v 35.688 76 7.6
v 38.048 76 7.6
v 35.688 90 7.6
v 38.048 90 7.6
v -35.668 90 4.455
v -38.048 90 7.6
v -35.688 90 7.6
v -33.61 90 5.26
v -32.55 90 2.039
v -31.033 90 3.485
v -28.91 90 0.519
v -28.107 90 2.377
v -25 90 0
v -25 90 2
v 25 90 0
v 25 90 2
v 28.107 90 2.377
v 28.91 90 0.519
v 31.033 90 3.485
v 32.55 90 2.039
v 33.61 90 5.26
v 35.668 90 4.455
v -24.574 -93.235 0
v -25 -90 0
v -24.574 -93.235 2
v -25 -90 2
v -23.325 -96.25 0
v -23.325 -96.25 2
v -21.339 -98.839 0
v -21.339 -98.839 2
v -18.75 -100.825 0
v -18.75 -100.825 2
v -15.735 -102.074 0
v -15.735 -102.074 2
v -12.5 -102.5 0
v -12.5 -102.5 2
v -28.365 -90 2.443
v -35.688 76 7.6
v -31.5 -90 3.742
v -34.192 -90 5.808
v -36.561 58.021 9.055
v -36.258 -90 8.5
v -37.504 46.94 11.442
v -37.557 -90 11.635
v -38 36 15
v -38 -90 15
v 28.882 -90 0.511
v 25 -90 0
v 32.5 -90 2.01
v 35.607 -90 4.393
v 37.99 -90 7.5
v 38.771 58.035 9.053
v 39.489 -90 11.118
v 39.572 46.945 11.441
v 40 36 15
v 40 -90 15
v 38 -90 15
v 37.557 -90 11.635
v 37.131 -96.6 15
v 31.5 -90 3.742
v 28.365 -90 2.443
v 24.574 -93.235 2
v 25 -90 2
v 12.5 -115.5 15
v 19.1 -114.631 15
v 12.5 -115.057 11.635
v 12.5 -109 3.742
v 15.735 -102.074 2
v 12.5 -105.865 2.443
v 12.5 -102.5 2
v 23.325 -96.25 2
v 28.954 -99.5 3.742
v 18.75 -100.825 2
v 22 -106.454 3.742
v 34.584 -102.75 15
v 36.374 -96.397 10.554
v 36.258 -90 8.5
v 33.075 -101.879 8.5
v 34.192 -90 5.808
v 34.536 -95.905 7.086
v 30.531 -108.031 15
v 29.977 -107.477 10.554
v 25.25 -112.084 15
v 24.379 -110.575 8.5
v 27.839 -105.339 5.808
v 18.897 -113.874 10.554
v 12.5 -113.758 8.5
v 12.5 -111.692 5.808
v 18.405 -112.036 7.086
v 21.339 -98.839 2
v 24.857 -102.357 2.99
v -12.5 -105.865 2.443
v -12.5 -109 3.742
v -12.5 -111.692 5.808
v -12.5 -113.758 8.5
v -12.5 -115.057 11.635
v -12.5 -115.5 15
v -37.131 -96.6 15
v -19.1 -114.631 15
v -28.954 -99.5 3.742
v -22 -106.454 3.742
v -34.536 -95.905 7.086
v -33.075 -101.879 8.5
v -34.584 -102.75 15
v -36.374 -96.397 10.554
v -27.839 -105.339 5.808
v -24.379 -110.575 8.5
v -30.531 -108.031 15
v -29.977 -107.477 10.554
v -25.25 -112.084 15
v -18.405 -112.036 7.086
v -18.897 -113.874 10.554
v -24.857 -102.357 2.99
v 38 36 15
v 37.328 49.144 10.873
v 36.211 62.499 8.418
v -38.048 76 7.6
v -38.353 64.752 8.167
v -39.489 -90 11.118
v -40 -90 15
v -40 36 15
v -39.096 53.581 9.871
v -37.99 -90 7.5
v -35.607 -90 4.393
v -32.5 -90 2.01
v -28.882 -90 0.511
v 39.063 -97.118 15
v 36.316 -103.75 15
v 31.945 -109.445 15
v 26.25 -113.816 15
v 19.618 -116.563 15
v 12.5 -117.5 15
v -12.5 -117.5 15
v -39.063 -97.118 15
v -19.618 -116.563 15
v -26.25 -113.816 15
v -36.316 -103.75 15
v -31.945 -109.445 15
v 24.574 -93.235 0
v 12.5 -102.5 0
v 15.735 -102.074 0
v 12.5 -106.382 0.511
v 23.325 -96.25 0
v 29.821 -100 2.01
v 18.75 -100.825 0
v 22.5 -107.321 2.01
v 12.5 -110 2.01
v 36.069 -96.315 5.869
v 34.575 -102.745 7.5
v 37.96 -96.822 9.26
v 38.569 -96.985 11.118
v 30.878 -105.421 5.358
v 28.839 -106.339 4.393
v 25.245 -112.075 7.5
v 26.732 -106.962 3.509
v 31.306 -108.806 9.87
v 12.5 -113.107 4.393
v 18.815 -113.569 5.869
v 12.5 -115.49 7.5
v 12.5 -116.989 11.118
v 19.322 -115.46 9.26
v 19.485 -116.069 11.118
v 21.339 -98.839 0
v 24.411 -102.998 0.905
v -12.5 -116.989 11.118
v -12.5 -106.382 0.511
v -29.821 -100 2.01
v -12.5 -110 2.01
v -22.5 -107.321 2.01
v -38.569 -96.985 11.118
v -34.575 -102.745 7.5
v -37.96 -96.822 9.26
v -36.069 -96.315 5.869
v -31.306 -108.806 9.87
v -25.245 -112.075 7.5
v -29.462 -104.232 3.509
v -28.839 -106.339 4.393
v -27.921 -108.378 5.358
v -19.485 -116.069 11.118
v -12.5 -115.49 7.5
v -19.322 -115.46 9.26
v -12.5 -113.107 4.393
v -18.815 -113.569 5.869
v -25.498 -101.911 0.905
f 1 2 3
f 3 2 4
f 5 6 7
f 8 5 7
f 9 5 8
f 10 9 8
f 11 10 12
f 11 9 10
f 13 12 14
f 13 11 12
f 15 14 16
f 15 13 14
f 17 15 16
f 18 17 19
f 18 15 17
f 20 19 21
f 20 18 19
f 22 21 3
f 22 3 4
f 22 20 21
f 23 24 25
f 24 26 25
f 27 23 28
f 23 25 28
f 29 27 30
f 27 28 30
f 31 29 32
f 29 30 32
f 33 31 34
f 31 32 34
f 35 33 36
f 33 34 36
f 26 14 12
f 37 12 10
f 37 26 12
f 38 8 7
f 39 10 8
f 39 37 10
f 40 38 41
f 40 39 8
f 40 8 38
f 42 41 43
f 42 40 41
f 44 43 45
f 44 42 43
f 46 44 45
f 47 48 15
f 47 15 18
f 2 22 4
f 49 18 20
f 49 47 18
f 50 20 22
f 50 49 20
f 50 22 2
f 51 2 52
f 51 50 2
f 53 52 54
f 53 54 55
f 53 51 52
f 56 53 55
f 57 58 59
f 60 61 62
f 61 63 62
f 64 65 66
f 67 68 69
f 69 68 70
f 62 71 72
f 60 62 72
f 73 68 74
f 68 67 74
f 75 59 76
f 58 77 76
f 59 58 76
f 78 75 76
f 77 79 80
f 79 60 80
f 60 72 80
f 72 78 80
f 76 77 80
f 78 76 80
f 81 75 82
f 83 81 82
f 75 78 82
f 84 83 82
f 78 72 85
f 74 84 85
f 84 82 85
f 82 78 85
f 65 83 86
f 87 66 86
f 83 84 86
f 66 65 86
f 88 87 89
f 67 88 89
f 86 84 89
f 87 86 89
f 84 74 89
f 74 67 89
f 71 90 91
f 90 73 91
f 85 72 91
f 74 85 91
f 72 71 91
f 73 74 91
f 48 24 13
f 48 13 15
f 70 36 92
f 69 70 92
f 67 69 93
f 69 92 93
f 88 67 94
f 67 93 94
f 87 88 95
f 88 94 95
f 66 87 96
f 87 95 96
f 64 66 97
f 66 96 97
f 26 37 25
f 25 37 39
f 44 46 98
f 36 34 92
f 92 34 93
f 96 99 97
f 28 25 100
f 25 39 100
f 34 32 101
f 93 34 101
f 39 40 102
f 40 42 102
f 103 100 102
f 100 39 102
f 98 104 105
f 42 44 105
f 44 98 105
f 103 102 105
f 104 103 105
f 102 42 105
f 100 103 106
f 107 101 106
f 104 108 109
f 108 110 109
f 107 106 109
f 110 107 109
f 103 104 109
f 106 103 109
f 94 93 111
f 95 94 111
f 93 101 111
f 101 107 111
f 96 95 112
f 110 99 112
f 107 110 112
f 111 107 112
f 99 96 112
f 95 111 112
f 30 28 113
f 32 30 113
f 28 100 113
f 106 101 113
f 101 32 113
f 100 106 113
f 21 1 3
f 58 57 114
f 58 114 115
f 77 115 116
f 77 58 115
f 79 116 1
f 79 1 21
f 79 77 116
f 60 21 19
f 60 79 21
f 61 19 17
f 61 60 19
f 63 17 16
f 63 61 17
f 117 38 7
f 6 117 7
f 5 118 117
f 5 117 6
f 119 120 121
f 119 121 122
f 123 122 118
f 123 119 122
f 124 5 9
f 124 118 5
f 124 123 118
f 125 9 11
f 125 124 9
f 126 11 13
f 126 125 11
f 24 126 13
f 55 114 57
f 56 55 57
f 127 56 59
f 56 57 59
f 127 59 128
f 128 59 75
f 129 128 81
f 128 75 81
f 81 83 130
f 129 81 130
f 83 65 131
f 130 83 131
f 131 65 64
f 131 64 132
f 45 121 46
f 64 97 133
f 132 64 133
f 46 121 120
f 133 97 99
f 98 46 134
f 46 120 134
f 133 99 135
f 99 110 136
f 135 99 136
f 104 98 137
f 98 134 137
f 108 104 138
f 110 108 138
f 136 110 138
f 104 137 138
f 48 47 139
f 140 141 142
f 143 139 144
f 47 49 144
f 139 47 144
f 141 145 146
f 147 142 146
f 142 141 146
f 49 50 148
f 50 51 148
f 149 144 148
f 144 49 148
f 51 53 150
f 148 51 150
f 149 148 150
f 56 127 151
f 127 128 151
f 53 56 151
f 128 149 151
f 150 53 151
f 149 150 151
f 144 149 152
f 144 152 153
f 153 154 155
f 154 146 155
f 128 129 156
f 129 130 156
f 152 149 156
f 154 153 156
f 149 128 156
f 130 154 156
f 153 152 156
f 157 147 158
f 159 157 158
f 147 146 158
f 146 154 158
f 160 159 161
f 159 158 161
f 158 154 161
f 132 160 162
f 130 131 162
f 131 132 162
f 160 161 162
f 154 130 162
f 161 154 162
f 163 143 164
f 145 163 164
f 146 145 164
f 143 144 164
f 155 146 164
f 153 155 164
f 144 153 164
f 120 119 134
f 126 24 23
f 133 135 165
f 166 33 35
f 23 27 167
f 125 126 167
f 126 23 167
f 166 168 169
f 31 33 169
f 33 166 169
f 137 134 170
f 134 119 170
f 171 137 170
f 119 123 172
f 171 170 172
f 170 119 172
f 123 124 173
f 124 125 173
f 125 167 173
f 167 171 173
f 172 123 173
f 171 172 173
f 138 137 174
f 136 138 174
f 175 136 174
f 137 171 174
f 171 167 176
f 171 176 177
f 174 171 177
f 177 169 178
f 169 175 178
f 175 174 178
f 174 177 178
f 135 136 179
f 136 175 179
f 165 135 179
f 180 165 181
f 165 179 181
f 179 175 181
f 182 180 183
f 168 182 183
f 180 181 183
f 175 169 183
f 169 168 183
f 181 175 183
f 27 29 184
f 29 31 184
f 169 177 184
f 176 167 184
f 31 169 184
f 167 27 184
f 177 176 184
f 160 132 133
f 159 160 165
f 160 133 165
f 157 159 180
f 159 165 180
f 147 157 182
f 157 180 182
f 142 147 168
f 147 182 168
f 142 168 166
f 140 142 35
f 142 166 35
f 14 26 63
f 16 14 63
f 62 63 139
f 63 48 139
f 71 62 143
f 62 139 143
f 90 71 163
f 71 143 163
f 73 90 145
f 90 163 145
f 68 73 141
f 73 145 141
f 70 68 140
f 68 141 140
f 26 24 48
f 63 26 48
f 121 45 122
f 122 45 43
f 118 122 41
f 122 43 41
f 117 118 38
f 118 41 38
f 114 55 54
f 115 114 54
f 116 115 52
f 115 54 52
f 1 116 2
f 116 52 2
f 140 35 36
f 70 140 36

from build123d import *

# Parameters (mm, degrees)
F0_W     = 80
F0_H     = 180
F1_DEPTH = 15
F2_W     = 50
F2_H     = 2
F3_DEPTH = 180
F4_ANGLE = 90
F5_ANGLE = 90
F6_DEPTH = 25
F9_DEPTH = 80.001


with BuildPart() as f1:
    # F0 (on Top) → F1 (new body)
    with BuildSketch(Plane.XY):
        Rectangle(F0_W, F0_H)
    extrude(amount=F1_DEPTH)

    # F2 (on face) → F3 (intersect, through all)
    with BuildSketch(Plane.XZ.offset(90)):
        with BuildLine():
            Line((-38, 15), (-40, 15))
            ThreePointArc((-40, 15), (-35.6066017178, 4.3933982822), (-25, 0))
            Line((-25, 0), (-25, 2))
            ThreePointArc((-25, 2), (-34.1923881554, 5.8076118446), (-38, 15))
        make_face()
        with Locations((0, 1)):
            Rectangle(F2_W, F2_H)
        with BuildLine():
            Line((25, 2), (25, 0))
            ThreePointArc((25, 0), (35.6066017178, 4.3933982822), (40, 15))
            Line((40, 15), (38, 15))
            ThreePointArc((38, 15), (34.1923881554, 5.8076118446), (25, 2))
        make_face()
    extrude(amount=-F3_DEPTH, mode=Mode.INTERSECT)

    # F2 (on face) → F4 (revolve)
    with BuildSketch(Plane.XZ.offset(90)):
        with BuildLine():
            Line((25, 2), (25, 0))
            ThreePointArc((25, 0), (35.6066017178, 4.3933982822), (40, 15))
            Line((40, 15), (38, 15))
            ThreePointArc((38, 15), (34.1923881554, 5.8076118446), (25, 2))
        make_face()
    revolve(axis=Axis((12.5, -90, 8.5), (0, 0, -1)), revolution_arc=F4_ANGLE)

    # F2 (on face) → F5 (revolve)
    with BuildSketch(Plane.XZ.offset(90)):
        with BuildLine():
            Line((-38, 15), (-40, 15))
            ThreePointArc((-40, 15), (-35.6066017178, 4.3933982822), (-25, 0))
            Line((-25, 0), (-25, 2))
            ThreePointArc((-25, 2), (-34.1923881554, 5.8076118446), (-38, 15))
        make_face()
    revolve(axis=Axis((-12.5, -90, 8.5), (0, 0, 1)), revolution_arc=F5_ANGLE)

    # F6 (add, through all): a face of the model
    f6_faces = [f1.faces().sort_by_distance(p)[0] for p in [
        (-12.5, -111.8423881554, 5.6576118446),
    ]]
    extrude(f6_faces, amount=F6_DEPTH)

    # F8 (on face) → F9 (cut, through all)
    with BuildSketch(Plane.YZ.offset(40)):
        with BuildLine():
            Line((90, 7.6), (90, 15))
            Line((90, 15), (36, 15))
            ThreePointArc((36, 15), (55.6606293116, 9.4655638465), (76, 7.6))
            Line((76, 7.6), (90, 7.6))
        make_face()
    extrude(amount=-F9_DEPTH, mode=Mode.SUBTRACT)


solid = f1.part
